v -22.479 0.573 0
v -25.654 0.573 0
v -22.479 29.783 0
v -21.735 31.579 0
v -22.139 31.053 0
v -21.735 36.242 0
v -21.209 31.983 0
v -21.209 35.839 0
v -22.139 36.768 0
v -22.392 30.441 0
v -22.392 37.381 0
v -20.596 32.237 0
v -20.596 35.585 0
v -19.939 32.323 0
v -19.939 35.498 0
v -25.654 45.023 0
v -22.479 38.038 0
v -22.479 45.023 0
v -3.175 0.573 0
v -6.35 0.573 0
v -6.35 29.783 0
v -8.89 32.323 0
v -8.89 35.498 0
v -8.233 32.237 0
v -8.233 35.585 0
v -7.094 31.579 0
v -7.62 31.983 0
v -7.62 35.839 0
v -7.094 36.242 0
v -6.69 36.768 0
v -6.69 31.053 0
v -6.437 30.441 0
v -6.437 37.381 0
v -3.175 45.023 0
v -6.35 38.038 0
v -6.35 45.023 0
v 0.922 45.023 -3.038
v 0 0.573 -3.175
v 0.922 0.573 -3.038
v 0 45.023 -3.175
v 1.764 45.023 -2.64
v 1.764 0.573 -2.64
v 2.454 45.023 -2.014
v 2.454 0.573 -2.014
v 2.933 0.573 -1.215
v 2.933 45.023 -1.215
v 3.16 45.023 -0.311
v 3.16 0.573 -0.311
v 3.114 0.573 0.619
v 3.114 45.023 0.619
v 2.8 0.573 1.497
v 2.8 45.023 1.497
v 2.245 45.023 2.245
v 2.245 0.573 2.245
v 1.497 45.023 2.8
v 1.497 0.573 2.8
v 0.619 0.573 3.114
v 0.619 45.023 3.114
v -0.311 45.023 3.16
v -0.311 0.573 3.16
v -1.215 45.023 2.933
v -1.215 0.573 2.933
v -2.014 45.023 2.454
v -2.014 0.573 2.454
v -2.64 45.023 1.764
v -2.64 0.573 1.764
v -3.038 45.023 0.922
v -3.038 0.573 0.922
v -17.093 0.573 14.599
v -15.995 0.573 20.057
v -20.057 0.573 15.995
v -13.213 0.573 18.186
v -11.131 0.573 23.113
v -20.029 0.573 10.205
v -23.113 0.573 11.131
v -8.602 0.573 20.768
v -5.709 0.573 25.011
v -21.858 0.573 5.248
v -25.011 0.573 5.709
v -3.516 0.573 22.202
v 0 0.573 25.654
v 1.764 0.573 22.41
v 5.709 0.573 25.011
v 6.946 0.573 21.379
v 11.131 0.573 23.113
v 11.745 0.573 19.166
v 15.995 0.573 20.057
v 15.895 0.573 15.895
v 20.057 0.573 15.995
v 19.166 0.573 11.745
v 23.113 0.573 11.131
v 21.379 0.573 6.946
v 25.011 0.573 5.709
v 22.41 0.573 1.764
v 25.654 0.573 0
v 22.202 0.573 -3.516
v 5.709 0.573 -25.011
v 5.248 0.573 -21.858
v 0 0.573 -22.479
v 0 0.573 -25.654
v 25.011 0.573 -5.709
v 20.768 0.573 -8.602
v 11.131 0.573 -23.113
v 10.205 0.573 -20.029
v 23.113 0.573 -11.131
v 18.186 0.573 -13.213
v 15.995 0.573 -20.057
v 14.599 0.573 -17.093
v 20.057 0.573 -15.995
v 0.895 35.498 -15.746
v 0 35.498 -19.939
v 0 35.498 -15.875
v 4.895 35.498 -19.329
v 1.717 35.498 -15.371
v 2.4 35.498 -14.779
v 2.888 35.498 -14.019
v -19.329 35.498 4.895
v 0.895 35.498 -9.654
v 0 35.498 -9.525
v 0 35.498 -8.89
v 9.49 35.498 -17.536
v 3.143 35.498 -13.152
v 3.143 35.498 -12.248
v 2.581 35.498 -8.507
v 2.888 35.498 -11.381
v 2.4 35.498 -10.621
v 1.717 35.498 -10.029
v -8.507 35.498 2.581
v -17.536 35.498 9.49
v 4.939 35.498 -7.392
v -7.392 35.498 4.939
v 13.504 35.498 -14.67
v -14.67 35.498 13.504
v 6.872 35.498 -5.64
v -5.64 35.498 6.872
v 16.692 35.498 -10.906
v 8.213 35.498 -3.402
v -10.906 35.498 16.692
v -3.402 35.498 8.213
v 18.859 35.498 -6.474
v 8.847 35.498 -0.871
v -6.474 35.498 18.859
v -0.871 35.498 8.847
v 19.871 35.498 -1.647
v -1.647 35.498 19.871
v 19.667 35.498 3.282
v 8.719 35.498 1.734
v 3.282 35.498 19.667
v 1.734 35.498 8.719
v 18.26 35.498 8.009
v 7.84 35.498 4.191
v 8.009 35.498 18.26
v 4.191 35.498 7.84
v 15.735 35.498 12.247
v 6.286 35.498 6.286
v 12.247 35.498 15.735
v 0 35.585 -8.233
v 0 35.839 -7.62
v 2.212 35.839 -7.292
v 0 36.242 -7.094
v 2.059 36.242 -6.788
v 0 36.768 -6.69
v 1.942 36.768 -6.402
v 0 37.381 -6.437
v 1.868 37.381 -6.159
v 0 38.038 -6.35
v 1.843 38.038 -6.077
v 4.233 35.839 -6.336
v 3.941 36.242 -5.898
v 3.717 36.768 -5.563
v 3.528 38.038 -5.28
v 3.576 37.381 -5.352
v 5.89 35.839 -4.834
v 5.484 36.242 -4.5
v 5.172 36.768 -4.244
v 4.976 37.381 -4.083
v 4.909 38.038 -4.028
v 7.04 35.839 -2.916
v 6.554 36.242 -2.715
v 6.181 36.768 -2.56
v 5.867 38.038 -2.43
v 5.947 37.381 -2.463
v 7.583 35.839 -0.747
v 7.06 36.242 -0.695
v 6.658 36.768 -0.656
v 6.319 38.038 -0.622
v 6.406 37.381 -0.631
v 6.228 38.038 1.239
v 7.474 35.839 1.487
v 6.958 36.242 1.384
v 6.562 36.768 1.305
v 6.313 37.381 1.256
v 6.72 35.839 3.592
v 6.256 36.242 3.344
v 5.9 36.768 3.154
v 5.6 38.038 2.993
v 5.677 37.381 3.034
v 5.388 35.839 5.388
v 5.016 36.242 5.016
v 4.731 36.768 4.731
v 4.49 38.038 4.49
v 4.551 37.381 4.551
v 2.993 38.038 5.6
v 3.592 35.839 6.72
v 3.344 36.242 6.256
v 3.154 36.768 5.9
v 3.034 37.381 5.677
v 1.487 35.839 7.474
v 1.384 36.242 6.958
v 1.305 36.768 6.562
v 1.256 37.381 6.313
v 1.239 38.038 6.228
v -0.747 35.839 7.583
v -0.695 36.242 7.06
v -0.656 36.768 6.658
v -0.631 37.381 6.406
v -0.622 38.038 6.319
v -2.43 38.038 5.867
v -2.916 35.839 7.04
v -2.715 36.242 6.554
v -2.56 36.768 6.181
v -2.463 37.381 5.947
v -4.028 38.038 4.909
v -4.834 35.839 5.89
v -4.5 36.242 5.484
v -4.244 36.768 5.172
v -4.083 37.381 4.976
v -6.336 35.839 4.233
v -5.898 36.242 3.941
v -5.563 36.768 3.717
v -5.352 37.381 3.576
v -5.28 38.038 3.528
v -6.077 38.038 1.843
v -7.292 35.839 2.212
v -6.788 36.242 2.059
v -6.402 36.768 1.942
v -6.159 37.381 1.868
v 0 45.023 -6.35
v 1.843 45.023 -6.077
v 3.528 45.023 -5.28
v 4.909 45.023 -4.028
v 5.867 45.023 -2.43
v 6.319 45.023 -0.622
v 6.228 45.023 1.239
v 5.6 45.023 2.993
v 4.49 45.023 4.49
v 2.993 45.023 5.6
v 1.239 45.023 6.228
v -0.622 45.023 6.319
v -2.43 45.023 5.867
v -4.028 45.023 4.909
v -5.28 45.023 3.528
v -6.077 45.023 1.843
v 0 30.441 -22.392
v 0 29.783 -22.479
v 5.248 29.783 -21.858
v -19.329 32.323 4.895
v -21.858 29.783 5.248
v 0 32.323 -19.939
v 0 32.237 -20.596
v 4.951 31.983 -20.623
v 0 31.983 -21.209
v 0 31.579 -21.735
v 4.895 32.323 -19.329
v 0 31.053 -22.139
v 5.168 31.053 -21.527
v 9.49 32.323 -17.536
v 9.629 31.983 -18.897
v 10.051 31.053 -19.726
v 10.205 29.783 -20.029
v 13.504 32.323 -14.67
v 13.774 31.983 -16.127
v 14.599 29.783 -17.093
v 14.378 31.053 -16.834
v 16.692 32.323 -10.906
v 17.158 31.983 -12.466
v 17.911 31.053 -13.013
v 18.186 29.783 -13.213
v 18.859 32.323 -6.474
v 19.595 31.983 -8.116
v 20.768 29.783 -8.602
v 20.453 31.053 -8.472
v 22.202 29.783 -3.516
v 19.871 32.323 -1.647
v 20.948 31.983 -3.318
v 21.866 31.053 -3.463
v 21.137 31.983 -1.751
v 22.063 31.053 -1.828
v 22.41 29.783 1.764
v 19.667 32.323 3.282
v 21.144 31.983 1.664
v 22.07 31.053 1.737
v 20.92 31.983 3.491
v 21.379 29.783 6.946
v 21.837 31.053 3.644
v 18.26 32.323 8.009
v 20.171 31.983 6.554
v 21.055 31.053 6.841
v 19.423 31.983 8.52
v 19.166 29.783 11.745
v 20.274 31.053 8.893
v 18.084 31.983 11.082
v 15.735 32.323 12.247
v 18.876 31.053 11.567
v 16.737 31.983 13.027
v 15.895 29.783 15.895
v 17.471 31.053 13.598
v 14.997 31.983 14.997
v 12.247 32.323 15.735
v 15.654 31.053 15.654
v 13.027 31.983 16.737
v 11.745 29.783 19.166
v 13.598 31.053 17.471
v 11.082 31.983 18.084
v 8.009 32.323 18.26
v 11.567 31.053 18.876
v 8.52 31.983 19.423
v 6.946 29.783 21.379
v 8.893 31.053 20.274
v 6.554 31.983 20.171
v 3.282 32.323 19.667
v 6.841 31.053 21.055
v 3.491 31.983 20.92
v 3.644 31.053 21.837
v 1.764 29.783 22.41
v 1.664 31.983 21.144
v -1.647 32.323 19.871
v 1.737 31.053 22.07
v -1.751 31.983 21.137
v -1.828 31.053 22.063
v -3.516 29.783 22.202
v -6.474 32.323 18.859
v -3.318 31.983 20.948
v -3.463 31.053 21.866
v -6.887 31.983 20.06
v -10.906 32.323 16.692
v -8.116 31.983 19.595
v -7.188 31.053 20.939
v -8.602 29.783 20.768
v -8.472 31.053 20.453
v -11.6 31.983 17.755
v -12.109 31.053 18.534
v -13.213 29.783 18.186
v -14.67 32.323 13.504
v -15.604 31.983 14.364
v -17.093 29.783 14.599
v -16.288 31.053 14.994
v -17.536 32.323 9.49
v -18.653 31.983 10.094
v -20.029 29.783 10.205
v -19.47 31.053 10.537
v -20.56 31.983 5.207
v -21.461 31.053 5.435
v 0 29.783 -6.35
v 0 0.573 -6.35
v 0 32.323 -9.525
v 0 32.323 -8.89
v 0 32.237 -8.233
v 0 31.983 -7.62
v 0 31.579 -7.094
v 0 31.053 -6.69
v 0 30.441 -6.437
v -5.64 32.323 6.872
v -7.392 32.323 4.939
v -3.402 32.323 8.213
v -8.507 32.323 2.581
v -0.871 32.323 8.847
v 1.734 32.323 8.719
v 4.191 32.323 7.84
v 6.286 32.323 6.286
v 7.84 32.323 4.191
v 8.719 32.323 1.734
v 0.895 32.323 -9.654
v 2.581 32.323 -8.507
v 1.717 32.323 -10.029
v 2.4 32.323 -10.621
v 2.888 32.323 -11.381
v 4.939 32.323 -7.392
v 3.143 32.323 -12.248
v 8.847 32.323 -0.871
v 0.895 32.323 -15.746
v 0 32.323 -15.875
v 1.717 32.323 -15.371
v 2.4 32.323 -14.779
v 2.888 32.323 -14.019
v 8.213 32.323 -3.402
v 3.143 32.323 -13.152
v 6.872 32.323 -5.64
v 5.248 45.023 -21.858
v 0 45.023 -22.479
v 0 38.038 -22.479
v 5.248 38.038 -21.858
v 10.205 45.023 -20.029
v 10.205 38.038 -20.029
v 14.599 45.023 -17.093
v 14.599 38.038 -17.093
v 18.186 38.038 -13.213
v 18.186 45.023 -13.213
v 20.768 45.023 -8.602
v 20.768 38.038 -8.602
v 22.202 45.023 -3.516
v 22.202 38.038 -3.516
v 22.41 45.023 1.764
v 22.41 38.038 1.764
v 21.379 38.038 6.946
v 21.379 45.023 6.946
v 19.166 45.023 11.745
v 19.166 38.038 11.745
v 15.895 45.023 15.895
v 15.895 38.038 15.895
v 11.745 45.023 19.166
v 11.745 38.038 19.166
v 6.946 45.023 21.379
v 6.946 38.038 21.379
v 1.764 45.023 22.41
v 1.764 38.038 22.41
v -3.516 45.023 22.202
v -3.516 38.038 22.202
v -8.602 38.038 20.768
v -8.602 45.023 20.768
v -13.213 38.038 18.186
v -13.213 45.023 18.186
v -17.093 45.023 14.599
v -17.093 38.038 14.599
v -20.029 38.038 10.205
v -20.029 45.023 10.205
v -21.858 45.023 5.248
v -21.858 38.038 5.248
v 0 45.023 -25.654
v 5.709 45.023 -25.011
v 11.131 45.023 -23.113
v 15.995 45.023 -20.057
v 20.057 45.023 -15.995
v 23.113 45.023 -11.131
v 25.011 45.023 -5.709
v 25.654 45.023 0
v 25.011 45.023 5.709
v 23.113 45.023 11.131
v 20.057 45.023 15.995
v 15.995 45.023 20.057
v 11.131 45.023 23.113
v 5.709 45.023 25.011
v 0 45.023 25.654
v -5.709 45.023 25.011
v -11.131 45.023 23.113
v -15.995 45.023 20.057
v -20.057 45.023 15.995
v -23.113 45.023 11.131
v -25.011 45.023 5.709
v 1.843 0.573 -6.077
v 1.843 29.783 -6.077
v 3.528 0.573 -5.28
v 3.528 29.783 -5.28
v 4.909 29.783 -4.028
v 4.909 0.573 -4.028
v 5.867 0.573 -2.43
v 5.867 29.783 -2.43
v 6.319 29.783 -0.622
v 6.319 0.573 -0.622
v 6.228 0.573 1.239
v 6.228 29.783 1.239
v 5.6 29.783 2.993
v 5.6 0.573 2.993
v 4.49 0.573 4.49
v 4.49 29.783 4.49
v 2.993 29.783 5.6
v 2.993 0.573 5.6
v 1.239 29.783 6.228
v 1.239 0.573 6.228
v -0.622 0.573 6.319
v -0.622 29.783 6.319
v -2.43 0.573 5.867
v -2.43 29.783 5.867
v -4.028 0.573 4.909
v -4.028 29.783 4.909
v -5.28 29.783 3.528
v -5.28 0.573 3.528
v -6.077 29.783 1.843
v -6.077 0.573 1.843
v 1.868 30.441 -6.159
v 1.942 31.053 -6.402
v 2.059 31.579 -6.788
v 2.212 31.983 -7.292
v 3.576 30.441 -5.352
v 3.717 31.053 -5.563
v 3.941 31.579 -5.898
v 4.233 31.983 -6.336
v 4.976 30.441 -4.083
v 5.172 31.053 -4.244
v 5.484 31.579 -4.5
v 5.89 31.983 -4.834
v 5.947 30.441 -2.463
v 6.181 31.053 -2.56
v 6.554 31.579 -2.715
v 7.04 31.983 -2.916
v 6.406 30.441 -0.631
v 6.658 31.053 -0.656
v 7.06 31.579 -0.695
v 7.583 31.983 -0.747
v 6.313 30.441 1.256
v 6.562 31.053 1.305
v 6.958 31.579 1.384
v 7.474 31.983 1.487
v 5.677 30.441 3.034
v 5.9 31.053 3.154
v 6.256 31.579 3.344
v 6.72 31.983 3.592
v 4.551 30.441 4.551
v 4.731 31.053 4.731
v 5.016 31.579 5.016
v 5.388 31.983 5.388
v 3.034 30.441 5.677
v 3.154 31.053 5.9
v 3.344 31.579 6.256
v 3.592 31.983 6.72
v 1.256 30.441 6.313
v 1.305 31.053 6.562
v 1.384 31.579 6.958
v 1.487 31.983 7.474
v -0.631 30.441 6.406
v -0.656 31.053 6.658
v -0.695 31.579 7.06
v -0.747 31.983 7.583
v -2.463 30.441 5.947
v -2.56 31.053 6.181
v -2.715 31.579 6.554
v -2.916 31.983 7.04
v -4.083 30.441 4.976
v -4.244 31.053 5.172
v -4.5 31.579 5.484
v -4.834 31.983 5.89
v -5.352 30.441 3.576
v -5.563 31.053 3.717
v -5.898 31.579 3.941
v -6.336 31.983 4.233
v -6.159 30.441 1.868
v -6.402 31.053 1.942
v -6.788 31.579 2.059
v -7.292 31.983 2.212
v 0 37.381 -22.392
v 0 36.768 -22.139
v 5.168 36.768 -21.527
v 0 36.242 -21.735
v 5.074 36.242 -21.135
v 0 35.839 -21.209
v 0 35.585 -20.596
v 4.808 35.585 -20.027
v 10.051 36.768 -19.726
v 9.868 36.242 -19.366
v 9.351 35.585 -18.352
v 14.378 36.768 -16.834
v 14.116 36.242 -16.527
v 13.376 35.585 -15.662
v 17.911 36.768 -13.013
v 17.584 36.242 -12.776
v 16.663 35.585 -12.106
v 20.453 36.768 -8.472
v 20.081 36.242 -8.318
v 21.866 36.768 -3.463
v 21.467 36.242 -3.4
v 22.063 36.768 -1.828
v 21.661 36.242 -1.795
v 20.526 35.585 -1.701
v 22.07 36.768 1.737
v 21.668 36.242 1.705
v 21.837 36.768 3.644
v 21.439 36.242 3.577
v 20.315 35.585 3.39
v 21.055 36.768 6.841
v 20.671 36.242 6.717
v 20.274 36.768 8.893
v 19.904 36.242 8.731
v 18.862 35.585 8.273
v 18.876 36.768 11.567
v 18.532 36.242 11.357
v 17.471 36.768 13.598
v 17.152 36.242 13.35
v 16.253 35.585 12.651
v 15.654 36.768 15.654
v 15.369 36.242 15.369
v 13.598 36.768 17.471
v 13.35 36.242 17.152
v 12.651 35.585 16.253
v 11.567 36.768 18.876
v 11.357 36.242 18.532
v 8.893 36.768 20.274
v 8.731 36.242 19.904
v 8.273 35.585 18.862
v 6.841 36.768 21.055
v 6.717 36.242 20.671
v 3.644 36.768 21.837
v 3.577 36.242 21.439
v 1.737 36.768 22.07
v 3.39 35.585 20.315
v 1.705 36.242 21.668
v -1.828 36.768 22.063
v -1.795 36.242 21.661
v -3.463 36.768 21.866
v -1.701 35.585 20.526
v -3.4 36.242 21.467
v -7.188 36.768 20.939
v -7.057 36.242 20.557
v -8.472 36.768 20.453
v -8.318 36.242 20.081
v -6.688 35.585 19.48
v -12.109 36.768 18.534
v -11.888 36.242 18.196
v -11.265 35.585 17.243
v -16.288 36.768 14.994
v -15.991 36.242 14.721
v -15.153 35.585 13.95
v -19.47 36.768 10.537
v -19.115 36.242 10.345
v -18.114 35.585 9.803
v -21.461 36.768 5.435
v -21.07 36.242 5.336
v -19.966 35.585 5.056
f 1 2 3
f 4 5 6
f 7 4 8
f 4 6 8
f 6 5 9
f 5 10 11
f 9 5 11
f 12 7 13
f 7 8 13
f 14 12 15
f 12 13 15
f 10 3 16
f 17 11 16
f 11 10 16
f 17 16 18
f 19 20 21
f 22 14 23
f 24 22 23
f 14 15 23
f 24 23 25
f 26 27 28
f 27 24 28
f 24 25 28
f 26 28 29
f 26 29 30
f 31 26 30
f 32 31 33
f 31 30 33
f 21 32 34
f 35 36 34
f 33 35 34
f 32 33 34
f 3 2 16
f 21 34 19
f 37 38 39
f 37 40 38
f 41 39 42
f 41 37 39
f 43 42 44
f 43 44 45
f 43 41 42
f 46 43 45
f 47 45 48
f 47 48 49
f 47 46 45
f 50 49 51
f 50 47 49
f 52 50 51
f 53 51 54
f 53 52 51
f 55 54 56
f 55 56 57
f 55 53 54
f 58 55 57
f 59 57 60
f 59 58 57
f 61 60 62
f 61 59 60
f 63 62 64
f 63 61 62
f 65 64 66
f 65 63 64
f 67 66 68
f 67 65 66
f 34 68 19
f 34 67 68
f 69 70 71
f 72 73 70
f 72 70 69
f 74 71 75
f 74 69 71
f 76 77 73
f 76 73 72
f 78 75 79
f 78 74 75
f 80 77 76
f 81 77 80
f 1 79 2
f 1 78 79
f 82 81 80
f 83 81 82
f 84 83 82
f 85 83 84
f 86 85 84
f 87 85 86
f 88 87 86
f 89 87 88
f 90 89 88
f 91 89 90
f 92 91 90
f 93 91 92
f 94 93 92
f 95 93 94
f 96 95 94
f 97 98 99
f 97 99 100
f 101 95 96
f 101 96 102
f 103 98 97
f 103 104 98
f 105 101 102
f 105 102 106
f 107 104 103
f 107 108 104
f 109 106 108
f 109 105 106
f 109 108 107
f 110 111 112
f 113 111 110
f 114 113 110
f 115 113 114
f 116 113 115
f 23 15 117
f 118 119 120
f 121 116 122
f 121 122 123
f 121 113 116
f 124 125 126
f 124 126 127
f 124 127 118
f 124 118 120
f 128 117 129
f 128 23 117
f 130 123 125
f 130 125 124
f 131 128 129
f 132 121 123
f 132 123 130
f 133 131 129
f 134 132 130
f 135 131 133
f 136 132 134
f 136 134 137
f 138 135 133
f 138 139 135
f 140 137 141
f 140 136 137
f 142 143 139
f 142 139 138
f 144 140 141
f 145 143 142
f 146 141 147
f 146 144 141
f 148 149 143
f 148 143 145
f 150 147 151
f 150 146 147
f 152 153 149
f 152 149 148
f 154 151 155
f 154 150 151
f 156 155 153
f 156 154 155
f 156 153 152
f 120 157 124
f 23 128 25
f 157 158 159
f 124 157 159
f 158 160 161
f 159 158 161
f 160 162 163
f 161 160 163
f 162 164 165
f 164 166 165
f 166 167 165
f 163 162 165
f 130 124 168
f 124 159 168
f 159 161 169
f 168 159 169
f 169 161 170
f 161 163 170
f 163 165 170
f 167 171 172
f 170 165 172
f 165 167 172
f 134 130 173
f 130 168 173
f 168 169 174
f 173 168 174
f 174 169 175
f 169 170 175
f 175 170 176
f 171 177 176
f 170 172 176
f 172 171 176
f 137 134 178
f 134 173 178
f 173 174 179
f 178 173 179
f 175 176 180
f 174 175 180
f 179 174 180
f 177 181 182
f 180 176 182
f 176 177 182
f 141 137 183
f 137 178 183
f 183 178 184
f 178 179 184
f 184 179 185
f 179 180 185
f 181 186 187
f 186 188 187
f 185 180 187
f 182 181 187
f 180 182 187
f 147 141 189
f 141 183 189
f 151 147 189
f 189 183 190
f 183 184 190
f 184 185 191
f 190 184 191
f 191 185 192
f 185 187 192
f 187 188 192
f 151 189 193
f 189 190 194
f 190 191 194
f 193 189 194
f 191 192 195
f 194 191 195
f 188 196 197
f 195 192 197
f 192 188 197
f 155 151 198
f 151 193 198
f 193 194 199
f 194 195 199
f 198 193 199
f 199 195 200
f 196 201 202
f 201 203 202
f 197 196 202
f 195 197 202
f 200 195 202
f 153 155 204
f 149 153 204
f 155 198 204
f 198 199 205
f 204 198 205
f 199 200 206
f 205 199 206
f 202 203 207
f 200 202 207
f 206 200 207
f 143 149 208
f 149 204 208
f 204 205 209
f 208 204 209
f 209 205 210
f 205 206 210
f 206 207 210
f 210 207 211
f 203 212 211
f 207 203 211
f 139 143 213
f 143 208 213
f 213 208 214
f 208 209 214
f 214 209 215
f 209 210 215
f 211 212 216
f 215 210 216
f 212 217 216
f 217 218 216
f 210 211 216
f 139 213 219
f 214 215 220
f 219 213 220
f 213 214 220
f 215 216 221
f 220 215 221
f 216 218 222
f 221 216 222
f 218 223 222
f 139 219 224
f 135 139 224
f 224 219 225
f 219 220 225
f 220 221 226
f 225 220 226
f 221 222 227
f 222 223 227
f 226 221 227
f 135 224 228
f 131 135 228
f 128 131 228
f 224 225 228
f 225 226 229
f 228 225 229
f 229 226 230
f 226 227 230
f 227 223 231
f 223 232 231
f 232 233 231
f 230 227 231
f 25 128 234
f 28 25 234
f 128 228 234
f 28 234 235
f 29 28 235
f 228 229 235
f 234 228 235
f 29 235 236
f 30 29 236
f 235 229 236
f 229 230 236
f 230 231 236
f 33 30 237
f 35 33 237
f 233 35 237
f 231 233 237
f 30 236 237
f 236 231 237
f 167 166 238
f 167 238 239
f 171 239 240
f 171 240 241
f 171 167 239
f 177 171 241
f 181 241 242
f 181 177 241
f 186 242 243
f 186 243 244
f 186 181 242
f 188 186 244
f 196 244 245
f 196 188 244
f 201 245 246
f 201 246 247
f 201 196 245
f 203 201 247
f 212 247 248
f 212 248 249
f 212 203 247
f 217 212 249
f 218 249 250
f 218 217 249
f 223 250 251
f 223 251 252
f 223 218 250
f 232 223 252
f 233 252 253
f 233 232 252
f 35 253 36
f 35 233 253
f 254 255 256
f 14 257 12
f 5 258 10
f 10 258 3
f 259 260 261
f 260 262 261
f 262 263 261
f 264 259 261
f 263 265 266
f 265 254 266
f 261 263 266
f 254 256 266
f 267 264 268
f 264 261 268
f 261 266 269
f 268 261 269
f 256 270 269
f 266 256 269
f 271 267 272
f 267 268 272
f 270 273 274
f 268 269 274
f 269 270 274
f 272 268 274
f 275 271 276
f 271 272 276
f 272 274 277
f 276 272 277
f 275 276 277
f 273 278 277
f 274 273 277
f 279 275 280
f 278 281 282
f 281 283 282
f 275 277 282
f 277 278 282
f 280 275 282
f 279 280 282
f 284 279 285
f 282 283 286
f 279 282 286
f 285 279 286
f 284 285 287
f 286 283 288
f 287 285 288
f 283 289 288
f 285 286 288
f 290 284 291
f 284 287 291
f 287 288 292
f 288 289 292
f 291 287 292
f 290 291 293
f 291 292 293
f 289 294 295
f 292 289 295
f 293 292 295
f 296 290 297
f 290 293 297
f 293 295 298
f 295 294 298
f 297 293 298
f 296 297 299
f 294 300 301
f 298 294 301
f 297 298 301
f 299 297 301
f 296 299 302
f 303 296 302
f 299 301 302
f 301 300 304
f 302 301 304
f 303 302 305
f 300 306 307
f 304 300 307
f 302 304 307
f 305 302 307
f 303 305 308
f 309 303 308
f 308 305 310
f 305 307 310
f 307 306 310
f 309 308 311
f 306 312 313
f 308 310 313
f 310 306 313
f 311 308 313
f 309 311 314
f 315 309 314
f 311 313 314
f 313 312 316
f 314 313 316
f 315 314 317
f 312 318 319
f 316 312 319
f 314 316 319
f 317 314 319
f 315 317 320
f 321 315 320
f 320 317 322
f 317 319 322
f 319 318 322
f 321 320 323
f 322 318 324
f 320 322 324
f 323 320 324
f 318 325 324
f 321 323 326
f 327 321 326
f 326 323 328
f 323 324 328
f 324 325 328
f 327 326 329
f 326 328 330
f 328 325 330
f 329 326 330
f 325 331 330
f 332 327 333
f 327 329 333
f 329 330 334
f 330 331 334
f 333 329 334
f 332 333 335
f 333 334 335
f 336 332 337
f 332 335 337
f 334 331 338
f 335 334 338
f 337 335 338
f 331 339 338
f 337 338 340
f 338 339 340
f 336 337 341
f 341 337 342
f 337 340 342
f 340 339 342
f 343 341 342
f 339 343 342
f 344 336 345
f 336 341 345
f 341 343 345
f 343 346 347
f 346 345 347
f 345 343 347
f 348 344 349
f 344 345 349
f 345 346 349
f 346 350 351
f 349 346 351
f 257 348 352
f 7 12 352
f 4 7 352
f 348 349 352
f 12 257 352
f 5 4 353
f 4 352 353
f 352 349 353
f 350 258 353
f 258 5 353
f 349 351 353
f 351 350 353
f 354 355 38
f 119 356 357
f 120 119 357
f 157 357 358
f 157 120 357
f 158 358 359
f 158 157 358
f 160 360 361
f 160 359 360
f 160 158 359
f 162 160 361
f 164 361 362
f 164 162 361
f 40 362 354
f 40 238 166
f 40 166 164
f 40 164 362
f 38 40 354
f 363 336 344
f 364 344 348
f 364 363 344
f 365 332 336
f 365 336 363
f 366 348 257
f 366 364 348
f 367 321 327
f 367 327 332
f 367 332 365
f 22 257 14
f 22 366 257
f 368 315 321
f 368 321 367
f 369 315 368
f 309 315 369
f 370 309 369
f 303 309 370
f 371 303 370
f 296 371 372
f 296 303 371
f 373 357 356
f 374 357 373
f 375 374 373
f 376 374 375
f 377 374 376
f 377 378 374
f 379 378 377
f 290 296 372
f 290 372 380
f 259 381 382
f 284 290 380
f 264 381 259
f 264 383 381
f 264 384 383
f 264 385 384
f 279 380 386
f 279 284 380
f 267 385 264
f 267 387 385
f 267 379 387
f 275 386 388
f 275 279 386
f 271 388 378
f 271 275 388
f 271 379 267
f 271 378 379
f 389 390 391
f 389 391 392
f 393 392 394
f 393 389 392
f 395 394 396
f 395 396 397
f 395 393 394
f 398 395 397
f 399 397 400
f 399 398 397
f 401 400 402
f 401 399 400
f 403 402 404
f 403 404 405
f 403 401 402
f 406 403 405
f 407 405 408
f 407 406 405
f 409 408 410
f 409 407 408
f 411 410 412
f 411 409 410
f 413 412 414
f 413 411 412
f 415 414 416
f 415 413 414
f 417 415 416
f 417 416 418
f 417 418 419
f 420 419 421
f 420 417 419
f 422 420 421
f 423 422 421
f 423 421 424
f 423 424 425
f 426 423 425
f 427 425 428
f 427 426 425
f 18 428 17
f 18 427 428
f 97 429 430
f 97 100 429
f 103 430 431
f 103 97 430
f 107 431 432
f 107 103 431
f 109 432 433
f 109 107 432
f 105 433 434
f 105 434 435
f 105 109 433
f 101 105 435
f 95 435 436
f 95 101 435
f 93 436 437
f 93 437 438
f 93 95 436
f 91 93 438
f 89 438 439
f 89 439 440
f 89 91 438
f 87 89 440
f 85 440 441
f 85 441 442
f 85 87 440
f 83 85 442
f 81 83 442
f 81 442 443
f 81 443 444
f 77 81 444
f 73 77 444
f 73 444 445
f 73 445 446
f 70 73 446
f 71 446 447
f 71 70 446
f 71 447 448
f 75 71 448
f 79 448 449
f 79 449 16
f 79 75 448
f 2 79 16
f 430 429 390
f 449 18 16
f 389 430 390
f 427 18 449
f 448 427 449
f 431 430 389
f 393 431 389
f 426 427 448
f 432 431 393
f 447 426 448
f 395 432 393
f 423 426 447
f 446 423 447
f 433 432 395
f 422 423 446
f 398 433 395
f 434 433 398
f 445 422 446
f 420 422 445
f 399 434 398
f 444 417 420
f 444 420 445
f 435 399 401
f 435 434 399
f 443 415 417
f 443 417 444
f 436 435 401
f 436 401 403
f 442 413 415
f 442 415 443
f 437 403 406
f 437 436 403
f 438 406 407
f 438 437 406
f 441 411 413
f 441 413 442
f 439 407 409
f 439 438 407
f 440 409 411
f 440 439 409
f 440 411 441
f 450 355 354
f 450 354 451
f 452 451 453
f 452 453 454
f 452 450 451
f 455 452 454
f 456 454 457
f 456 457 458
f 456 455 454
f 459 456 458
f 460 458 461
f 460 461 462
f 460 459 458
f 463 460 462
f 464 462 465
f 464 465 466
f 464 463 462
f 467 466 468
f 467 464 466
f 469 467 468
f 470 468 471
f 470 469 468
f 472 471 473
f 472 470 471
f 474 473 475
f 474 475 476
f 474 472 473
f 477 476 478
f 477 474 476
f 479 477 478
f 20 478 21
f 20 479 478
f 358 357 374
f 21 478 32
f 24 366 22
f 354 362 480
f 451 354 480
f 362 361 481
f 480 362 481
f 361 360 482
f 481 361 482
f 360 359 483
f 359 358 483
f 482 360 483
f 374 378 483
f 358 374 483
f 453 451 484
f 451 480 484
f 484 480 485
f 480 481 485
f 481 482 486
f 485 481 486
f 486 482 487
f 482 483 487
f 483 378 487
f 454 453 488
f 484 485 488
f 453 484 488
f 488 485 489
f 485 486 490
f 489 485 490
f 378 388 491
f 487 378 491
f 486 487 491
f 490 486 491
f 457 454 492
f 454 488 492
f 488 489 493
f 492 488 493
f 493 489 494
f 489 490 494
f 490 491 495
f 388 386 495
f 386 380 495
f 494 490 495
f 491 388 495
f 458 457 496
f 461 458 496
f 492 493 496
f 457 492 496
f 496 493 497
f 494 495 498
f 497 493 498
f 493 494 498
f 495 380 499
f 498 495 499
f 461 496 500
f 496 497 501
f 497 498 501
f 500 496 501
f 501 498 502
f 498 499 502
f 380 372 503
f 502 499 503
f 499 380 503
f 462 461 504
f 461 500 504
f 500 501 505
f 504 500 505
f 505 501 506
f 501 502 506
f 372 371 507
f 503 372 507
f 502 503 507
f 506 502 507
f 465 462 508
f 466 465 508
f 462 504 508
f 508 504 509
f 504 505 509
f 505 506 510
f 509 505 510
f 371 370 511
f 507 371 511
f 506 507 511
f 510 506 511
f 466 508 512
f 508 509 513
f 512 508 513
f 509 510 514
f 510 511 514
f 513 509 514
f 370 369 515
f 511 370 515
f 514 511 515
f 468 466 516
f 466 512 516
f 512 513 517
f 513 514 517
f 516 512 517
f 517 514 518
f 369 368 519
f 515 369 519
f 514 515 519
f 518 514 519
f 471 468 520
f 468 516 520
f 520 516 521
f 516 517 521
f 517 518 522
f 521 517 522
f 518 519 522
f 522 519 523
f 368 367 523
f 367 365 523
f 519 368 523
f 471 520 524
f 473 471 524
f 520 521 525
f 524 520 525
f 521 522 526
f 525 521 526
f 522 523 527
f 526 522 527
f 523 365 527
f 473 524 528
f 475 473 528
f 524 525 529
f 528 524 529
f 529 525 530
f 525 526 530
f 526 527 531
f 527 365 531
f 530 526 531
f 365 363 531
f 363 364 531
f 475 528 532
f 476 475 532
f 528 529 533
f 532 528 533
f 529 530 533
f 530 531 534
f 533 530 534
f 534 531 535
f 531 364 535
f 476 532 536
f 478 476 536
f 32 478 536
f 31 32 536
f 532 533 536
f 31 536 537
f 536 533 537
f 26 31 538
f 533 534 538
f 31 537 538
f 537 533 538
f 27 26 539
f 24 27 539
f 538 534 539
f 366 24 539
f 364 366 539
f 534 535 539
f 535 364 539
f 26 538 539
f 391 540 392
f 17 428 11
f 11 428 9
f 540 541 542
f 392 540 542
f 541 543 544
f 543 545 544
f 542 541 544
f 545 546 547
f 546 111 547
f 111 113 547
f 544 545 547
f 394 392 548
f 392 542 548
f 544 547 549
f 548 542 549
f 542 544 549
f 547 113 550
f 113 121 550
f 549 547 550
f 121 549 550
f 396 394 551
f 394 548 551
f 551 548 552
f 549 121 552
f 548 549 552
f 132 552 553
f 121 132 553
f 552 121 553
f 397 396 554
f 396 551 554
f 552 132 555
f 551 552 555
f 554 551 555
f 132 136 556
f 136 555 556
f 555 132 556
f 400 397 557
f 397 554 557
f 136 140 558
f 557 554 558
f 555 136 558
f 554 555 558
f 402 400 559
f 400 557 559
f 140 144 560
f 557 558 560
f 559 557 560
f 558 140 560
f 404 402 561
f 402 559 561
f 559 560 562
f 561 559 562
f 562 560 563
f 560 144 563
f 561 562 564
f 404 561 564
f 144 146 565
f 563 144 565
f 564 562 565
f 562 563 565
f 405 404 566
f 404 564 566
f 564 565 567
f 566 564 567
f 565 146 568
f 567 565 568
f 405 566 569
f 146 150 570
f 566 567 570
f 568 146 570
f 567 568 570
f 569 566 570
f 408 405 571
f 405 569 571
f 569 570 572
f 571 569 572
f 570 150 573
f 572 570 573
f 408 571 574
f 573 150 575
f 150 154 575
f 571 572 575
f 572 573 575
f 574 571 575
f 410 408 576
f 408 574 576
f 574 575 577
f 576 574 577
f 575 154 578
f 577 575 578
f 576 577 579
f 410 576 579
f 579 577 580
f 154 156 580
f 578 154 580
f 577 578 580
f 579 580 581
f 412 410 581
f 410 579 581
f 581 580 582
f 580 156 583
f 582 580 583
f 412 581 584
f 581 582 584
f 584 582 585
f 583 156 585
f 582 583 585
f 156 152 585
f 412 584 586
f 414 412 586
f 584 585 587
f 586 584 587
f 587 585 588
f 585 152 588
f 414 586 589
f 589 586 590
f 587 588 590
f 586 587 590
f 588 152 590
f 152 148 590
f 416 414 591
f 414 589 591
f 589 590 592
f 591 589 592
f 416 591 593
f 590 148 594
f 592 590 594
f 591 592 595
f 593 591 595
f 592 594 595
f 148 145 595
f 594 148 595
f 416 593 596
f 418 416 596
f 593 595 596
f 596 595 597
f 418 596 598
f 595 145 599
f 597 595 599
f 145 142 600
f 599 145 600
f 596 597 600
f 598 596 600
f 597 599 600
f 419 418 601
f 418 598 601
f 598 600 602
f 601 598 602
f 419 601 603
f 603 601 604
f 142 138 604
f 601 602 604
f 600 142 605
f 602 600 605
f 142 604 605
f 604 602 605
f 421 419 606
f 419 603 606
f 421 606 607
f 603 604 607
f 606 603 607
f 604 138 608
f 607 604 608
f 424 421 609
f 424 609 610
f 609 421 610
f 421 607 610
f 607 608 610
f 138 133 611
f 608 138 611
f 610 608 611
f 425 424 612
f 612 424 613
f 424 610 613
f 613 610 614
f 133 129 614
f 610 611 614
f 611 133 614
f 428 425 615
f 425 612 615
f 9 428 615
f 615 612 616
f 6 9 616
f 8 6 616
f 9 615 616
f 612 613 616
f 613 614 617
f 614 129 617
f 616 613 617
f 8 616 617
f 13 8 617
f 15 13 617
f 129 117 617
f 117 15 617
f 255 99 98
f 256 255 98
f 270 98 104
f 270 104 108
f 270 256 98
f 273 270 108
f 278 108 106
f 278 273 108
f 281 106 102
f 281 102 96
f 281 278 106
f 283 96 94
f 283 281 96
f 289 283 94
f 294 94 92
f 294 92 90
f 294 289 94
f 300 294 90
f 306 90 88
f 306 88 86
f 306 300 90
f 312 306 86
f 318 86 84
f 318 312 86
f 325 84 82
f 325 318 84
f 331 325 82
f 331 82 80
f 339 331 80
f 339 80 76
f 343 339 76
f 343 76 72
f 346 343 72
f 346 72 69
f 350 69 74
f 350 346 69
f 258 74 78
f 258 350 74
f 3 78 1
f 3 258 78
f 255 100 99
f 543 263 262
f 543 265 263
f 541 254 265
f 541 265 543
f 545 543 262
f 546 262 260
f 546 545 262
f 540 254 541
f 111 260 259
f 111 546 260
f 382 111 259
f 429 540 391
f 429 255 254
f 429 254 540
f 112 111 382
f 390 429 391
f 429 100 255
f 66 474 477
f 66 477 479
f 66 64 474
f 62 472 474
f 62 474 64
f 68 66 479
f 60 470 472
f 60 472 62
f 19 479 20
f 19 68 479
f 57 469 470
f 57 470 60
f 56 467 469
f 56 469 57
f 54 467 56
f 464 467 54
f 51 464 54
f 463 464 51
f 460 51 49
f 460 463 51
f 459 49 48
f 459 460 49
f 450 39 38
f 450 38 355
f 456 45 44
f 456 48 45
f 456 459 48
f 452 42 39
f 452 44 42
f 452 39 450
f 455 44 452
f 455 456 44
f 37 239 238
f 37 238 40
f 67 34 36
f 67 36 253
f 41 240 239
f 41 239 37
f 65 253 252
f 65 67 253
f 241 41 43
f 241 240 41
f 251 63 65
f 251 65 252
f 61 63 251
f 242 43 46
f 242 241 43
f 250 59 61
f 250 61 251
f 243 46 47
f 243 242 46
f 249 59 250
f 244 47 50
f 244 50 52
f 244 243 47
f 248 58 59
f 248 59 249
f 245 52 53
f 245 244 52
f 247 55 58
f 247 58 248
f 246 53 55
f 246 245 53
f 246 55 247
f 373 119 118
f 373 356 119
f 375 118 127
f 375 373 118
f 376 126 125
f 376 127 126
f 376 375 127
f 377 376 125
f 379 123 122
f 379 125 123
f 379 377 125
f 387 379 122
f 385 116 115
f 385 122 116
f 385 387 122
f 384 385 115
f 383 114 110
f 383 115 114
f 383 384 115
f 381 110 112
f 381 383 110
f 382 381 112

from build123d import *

# Parameters (mm, degrees)
REVOLVE2_ANGLE     = 270
SKETCH5_R          = 3.175
CUT_EXTRUDE1_DEPTH = 46.023434974
FILLET1_R          = 2.54
FILLET2_R          = 2.54


with BuildPart() as part:
    # Sketch1 → Revolve2 (revolve)
    with BuildSketch(Plane(origin=(0, 0, 0), x_dir=(0, 0, -1), z_dir=(1, 0, 0))):
        Polygon((22.479, 35.498434974), (22.479, 45.023434974), (25.654, 45.023434974), (25.654, 0.573434974), (22.479, 0.573434974), (22.479, 32.323434974), (6.35, 32.323434974), (6.35, 0.573434974), (3.175, 0.573434974), (3.175, 45.023434974), (6.35, 45.023434974), (6.35, 35.498434974), align=None)
    revolve(axis=Axis((0, 45.023434974, 0), (0, -1, 0)), revolution_arc=REVOLVE2_ANGLE)

    # Sketch5 → Cut-Extrude1 (cut, through all)
    with BuildSketch(Plane(origin=(0, 0, 0), x_dir=(1, 0, 0), z_dir=(0, 1, 0))):
        with Locations((0, 12.7)):
            Circle(SKETCH5_R)
    extrude(amount=CUT_EXTRUDE1_DEPTH, mode=Mode.SUBTRACT)

    # Fillet1
    fillet1_edges = [part.edges().sort_by_distance(p)[0] for p in [
        (15.895053334, 32.323434974, 15.895053334),
        (4.490128061, 32.323434974, 4.490128061),
    ]]
    fillet(fillet1_edges, radius=FILLET1_R)

    # Fillet2
    fillet2_edges = [part.edges().sort_by_distance(p)[0] for p in [
        (4.490128061, 35.498434974, 4.490128061),
        (15.895053334, 35.498434974, 15.895053334),
    ]]
    fillet(fillet2_edges, radius=FILLET2_R)


solid = part.part
